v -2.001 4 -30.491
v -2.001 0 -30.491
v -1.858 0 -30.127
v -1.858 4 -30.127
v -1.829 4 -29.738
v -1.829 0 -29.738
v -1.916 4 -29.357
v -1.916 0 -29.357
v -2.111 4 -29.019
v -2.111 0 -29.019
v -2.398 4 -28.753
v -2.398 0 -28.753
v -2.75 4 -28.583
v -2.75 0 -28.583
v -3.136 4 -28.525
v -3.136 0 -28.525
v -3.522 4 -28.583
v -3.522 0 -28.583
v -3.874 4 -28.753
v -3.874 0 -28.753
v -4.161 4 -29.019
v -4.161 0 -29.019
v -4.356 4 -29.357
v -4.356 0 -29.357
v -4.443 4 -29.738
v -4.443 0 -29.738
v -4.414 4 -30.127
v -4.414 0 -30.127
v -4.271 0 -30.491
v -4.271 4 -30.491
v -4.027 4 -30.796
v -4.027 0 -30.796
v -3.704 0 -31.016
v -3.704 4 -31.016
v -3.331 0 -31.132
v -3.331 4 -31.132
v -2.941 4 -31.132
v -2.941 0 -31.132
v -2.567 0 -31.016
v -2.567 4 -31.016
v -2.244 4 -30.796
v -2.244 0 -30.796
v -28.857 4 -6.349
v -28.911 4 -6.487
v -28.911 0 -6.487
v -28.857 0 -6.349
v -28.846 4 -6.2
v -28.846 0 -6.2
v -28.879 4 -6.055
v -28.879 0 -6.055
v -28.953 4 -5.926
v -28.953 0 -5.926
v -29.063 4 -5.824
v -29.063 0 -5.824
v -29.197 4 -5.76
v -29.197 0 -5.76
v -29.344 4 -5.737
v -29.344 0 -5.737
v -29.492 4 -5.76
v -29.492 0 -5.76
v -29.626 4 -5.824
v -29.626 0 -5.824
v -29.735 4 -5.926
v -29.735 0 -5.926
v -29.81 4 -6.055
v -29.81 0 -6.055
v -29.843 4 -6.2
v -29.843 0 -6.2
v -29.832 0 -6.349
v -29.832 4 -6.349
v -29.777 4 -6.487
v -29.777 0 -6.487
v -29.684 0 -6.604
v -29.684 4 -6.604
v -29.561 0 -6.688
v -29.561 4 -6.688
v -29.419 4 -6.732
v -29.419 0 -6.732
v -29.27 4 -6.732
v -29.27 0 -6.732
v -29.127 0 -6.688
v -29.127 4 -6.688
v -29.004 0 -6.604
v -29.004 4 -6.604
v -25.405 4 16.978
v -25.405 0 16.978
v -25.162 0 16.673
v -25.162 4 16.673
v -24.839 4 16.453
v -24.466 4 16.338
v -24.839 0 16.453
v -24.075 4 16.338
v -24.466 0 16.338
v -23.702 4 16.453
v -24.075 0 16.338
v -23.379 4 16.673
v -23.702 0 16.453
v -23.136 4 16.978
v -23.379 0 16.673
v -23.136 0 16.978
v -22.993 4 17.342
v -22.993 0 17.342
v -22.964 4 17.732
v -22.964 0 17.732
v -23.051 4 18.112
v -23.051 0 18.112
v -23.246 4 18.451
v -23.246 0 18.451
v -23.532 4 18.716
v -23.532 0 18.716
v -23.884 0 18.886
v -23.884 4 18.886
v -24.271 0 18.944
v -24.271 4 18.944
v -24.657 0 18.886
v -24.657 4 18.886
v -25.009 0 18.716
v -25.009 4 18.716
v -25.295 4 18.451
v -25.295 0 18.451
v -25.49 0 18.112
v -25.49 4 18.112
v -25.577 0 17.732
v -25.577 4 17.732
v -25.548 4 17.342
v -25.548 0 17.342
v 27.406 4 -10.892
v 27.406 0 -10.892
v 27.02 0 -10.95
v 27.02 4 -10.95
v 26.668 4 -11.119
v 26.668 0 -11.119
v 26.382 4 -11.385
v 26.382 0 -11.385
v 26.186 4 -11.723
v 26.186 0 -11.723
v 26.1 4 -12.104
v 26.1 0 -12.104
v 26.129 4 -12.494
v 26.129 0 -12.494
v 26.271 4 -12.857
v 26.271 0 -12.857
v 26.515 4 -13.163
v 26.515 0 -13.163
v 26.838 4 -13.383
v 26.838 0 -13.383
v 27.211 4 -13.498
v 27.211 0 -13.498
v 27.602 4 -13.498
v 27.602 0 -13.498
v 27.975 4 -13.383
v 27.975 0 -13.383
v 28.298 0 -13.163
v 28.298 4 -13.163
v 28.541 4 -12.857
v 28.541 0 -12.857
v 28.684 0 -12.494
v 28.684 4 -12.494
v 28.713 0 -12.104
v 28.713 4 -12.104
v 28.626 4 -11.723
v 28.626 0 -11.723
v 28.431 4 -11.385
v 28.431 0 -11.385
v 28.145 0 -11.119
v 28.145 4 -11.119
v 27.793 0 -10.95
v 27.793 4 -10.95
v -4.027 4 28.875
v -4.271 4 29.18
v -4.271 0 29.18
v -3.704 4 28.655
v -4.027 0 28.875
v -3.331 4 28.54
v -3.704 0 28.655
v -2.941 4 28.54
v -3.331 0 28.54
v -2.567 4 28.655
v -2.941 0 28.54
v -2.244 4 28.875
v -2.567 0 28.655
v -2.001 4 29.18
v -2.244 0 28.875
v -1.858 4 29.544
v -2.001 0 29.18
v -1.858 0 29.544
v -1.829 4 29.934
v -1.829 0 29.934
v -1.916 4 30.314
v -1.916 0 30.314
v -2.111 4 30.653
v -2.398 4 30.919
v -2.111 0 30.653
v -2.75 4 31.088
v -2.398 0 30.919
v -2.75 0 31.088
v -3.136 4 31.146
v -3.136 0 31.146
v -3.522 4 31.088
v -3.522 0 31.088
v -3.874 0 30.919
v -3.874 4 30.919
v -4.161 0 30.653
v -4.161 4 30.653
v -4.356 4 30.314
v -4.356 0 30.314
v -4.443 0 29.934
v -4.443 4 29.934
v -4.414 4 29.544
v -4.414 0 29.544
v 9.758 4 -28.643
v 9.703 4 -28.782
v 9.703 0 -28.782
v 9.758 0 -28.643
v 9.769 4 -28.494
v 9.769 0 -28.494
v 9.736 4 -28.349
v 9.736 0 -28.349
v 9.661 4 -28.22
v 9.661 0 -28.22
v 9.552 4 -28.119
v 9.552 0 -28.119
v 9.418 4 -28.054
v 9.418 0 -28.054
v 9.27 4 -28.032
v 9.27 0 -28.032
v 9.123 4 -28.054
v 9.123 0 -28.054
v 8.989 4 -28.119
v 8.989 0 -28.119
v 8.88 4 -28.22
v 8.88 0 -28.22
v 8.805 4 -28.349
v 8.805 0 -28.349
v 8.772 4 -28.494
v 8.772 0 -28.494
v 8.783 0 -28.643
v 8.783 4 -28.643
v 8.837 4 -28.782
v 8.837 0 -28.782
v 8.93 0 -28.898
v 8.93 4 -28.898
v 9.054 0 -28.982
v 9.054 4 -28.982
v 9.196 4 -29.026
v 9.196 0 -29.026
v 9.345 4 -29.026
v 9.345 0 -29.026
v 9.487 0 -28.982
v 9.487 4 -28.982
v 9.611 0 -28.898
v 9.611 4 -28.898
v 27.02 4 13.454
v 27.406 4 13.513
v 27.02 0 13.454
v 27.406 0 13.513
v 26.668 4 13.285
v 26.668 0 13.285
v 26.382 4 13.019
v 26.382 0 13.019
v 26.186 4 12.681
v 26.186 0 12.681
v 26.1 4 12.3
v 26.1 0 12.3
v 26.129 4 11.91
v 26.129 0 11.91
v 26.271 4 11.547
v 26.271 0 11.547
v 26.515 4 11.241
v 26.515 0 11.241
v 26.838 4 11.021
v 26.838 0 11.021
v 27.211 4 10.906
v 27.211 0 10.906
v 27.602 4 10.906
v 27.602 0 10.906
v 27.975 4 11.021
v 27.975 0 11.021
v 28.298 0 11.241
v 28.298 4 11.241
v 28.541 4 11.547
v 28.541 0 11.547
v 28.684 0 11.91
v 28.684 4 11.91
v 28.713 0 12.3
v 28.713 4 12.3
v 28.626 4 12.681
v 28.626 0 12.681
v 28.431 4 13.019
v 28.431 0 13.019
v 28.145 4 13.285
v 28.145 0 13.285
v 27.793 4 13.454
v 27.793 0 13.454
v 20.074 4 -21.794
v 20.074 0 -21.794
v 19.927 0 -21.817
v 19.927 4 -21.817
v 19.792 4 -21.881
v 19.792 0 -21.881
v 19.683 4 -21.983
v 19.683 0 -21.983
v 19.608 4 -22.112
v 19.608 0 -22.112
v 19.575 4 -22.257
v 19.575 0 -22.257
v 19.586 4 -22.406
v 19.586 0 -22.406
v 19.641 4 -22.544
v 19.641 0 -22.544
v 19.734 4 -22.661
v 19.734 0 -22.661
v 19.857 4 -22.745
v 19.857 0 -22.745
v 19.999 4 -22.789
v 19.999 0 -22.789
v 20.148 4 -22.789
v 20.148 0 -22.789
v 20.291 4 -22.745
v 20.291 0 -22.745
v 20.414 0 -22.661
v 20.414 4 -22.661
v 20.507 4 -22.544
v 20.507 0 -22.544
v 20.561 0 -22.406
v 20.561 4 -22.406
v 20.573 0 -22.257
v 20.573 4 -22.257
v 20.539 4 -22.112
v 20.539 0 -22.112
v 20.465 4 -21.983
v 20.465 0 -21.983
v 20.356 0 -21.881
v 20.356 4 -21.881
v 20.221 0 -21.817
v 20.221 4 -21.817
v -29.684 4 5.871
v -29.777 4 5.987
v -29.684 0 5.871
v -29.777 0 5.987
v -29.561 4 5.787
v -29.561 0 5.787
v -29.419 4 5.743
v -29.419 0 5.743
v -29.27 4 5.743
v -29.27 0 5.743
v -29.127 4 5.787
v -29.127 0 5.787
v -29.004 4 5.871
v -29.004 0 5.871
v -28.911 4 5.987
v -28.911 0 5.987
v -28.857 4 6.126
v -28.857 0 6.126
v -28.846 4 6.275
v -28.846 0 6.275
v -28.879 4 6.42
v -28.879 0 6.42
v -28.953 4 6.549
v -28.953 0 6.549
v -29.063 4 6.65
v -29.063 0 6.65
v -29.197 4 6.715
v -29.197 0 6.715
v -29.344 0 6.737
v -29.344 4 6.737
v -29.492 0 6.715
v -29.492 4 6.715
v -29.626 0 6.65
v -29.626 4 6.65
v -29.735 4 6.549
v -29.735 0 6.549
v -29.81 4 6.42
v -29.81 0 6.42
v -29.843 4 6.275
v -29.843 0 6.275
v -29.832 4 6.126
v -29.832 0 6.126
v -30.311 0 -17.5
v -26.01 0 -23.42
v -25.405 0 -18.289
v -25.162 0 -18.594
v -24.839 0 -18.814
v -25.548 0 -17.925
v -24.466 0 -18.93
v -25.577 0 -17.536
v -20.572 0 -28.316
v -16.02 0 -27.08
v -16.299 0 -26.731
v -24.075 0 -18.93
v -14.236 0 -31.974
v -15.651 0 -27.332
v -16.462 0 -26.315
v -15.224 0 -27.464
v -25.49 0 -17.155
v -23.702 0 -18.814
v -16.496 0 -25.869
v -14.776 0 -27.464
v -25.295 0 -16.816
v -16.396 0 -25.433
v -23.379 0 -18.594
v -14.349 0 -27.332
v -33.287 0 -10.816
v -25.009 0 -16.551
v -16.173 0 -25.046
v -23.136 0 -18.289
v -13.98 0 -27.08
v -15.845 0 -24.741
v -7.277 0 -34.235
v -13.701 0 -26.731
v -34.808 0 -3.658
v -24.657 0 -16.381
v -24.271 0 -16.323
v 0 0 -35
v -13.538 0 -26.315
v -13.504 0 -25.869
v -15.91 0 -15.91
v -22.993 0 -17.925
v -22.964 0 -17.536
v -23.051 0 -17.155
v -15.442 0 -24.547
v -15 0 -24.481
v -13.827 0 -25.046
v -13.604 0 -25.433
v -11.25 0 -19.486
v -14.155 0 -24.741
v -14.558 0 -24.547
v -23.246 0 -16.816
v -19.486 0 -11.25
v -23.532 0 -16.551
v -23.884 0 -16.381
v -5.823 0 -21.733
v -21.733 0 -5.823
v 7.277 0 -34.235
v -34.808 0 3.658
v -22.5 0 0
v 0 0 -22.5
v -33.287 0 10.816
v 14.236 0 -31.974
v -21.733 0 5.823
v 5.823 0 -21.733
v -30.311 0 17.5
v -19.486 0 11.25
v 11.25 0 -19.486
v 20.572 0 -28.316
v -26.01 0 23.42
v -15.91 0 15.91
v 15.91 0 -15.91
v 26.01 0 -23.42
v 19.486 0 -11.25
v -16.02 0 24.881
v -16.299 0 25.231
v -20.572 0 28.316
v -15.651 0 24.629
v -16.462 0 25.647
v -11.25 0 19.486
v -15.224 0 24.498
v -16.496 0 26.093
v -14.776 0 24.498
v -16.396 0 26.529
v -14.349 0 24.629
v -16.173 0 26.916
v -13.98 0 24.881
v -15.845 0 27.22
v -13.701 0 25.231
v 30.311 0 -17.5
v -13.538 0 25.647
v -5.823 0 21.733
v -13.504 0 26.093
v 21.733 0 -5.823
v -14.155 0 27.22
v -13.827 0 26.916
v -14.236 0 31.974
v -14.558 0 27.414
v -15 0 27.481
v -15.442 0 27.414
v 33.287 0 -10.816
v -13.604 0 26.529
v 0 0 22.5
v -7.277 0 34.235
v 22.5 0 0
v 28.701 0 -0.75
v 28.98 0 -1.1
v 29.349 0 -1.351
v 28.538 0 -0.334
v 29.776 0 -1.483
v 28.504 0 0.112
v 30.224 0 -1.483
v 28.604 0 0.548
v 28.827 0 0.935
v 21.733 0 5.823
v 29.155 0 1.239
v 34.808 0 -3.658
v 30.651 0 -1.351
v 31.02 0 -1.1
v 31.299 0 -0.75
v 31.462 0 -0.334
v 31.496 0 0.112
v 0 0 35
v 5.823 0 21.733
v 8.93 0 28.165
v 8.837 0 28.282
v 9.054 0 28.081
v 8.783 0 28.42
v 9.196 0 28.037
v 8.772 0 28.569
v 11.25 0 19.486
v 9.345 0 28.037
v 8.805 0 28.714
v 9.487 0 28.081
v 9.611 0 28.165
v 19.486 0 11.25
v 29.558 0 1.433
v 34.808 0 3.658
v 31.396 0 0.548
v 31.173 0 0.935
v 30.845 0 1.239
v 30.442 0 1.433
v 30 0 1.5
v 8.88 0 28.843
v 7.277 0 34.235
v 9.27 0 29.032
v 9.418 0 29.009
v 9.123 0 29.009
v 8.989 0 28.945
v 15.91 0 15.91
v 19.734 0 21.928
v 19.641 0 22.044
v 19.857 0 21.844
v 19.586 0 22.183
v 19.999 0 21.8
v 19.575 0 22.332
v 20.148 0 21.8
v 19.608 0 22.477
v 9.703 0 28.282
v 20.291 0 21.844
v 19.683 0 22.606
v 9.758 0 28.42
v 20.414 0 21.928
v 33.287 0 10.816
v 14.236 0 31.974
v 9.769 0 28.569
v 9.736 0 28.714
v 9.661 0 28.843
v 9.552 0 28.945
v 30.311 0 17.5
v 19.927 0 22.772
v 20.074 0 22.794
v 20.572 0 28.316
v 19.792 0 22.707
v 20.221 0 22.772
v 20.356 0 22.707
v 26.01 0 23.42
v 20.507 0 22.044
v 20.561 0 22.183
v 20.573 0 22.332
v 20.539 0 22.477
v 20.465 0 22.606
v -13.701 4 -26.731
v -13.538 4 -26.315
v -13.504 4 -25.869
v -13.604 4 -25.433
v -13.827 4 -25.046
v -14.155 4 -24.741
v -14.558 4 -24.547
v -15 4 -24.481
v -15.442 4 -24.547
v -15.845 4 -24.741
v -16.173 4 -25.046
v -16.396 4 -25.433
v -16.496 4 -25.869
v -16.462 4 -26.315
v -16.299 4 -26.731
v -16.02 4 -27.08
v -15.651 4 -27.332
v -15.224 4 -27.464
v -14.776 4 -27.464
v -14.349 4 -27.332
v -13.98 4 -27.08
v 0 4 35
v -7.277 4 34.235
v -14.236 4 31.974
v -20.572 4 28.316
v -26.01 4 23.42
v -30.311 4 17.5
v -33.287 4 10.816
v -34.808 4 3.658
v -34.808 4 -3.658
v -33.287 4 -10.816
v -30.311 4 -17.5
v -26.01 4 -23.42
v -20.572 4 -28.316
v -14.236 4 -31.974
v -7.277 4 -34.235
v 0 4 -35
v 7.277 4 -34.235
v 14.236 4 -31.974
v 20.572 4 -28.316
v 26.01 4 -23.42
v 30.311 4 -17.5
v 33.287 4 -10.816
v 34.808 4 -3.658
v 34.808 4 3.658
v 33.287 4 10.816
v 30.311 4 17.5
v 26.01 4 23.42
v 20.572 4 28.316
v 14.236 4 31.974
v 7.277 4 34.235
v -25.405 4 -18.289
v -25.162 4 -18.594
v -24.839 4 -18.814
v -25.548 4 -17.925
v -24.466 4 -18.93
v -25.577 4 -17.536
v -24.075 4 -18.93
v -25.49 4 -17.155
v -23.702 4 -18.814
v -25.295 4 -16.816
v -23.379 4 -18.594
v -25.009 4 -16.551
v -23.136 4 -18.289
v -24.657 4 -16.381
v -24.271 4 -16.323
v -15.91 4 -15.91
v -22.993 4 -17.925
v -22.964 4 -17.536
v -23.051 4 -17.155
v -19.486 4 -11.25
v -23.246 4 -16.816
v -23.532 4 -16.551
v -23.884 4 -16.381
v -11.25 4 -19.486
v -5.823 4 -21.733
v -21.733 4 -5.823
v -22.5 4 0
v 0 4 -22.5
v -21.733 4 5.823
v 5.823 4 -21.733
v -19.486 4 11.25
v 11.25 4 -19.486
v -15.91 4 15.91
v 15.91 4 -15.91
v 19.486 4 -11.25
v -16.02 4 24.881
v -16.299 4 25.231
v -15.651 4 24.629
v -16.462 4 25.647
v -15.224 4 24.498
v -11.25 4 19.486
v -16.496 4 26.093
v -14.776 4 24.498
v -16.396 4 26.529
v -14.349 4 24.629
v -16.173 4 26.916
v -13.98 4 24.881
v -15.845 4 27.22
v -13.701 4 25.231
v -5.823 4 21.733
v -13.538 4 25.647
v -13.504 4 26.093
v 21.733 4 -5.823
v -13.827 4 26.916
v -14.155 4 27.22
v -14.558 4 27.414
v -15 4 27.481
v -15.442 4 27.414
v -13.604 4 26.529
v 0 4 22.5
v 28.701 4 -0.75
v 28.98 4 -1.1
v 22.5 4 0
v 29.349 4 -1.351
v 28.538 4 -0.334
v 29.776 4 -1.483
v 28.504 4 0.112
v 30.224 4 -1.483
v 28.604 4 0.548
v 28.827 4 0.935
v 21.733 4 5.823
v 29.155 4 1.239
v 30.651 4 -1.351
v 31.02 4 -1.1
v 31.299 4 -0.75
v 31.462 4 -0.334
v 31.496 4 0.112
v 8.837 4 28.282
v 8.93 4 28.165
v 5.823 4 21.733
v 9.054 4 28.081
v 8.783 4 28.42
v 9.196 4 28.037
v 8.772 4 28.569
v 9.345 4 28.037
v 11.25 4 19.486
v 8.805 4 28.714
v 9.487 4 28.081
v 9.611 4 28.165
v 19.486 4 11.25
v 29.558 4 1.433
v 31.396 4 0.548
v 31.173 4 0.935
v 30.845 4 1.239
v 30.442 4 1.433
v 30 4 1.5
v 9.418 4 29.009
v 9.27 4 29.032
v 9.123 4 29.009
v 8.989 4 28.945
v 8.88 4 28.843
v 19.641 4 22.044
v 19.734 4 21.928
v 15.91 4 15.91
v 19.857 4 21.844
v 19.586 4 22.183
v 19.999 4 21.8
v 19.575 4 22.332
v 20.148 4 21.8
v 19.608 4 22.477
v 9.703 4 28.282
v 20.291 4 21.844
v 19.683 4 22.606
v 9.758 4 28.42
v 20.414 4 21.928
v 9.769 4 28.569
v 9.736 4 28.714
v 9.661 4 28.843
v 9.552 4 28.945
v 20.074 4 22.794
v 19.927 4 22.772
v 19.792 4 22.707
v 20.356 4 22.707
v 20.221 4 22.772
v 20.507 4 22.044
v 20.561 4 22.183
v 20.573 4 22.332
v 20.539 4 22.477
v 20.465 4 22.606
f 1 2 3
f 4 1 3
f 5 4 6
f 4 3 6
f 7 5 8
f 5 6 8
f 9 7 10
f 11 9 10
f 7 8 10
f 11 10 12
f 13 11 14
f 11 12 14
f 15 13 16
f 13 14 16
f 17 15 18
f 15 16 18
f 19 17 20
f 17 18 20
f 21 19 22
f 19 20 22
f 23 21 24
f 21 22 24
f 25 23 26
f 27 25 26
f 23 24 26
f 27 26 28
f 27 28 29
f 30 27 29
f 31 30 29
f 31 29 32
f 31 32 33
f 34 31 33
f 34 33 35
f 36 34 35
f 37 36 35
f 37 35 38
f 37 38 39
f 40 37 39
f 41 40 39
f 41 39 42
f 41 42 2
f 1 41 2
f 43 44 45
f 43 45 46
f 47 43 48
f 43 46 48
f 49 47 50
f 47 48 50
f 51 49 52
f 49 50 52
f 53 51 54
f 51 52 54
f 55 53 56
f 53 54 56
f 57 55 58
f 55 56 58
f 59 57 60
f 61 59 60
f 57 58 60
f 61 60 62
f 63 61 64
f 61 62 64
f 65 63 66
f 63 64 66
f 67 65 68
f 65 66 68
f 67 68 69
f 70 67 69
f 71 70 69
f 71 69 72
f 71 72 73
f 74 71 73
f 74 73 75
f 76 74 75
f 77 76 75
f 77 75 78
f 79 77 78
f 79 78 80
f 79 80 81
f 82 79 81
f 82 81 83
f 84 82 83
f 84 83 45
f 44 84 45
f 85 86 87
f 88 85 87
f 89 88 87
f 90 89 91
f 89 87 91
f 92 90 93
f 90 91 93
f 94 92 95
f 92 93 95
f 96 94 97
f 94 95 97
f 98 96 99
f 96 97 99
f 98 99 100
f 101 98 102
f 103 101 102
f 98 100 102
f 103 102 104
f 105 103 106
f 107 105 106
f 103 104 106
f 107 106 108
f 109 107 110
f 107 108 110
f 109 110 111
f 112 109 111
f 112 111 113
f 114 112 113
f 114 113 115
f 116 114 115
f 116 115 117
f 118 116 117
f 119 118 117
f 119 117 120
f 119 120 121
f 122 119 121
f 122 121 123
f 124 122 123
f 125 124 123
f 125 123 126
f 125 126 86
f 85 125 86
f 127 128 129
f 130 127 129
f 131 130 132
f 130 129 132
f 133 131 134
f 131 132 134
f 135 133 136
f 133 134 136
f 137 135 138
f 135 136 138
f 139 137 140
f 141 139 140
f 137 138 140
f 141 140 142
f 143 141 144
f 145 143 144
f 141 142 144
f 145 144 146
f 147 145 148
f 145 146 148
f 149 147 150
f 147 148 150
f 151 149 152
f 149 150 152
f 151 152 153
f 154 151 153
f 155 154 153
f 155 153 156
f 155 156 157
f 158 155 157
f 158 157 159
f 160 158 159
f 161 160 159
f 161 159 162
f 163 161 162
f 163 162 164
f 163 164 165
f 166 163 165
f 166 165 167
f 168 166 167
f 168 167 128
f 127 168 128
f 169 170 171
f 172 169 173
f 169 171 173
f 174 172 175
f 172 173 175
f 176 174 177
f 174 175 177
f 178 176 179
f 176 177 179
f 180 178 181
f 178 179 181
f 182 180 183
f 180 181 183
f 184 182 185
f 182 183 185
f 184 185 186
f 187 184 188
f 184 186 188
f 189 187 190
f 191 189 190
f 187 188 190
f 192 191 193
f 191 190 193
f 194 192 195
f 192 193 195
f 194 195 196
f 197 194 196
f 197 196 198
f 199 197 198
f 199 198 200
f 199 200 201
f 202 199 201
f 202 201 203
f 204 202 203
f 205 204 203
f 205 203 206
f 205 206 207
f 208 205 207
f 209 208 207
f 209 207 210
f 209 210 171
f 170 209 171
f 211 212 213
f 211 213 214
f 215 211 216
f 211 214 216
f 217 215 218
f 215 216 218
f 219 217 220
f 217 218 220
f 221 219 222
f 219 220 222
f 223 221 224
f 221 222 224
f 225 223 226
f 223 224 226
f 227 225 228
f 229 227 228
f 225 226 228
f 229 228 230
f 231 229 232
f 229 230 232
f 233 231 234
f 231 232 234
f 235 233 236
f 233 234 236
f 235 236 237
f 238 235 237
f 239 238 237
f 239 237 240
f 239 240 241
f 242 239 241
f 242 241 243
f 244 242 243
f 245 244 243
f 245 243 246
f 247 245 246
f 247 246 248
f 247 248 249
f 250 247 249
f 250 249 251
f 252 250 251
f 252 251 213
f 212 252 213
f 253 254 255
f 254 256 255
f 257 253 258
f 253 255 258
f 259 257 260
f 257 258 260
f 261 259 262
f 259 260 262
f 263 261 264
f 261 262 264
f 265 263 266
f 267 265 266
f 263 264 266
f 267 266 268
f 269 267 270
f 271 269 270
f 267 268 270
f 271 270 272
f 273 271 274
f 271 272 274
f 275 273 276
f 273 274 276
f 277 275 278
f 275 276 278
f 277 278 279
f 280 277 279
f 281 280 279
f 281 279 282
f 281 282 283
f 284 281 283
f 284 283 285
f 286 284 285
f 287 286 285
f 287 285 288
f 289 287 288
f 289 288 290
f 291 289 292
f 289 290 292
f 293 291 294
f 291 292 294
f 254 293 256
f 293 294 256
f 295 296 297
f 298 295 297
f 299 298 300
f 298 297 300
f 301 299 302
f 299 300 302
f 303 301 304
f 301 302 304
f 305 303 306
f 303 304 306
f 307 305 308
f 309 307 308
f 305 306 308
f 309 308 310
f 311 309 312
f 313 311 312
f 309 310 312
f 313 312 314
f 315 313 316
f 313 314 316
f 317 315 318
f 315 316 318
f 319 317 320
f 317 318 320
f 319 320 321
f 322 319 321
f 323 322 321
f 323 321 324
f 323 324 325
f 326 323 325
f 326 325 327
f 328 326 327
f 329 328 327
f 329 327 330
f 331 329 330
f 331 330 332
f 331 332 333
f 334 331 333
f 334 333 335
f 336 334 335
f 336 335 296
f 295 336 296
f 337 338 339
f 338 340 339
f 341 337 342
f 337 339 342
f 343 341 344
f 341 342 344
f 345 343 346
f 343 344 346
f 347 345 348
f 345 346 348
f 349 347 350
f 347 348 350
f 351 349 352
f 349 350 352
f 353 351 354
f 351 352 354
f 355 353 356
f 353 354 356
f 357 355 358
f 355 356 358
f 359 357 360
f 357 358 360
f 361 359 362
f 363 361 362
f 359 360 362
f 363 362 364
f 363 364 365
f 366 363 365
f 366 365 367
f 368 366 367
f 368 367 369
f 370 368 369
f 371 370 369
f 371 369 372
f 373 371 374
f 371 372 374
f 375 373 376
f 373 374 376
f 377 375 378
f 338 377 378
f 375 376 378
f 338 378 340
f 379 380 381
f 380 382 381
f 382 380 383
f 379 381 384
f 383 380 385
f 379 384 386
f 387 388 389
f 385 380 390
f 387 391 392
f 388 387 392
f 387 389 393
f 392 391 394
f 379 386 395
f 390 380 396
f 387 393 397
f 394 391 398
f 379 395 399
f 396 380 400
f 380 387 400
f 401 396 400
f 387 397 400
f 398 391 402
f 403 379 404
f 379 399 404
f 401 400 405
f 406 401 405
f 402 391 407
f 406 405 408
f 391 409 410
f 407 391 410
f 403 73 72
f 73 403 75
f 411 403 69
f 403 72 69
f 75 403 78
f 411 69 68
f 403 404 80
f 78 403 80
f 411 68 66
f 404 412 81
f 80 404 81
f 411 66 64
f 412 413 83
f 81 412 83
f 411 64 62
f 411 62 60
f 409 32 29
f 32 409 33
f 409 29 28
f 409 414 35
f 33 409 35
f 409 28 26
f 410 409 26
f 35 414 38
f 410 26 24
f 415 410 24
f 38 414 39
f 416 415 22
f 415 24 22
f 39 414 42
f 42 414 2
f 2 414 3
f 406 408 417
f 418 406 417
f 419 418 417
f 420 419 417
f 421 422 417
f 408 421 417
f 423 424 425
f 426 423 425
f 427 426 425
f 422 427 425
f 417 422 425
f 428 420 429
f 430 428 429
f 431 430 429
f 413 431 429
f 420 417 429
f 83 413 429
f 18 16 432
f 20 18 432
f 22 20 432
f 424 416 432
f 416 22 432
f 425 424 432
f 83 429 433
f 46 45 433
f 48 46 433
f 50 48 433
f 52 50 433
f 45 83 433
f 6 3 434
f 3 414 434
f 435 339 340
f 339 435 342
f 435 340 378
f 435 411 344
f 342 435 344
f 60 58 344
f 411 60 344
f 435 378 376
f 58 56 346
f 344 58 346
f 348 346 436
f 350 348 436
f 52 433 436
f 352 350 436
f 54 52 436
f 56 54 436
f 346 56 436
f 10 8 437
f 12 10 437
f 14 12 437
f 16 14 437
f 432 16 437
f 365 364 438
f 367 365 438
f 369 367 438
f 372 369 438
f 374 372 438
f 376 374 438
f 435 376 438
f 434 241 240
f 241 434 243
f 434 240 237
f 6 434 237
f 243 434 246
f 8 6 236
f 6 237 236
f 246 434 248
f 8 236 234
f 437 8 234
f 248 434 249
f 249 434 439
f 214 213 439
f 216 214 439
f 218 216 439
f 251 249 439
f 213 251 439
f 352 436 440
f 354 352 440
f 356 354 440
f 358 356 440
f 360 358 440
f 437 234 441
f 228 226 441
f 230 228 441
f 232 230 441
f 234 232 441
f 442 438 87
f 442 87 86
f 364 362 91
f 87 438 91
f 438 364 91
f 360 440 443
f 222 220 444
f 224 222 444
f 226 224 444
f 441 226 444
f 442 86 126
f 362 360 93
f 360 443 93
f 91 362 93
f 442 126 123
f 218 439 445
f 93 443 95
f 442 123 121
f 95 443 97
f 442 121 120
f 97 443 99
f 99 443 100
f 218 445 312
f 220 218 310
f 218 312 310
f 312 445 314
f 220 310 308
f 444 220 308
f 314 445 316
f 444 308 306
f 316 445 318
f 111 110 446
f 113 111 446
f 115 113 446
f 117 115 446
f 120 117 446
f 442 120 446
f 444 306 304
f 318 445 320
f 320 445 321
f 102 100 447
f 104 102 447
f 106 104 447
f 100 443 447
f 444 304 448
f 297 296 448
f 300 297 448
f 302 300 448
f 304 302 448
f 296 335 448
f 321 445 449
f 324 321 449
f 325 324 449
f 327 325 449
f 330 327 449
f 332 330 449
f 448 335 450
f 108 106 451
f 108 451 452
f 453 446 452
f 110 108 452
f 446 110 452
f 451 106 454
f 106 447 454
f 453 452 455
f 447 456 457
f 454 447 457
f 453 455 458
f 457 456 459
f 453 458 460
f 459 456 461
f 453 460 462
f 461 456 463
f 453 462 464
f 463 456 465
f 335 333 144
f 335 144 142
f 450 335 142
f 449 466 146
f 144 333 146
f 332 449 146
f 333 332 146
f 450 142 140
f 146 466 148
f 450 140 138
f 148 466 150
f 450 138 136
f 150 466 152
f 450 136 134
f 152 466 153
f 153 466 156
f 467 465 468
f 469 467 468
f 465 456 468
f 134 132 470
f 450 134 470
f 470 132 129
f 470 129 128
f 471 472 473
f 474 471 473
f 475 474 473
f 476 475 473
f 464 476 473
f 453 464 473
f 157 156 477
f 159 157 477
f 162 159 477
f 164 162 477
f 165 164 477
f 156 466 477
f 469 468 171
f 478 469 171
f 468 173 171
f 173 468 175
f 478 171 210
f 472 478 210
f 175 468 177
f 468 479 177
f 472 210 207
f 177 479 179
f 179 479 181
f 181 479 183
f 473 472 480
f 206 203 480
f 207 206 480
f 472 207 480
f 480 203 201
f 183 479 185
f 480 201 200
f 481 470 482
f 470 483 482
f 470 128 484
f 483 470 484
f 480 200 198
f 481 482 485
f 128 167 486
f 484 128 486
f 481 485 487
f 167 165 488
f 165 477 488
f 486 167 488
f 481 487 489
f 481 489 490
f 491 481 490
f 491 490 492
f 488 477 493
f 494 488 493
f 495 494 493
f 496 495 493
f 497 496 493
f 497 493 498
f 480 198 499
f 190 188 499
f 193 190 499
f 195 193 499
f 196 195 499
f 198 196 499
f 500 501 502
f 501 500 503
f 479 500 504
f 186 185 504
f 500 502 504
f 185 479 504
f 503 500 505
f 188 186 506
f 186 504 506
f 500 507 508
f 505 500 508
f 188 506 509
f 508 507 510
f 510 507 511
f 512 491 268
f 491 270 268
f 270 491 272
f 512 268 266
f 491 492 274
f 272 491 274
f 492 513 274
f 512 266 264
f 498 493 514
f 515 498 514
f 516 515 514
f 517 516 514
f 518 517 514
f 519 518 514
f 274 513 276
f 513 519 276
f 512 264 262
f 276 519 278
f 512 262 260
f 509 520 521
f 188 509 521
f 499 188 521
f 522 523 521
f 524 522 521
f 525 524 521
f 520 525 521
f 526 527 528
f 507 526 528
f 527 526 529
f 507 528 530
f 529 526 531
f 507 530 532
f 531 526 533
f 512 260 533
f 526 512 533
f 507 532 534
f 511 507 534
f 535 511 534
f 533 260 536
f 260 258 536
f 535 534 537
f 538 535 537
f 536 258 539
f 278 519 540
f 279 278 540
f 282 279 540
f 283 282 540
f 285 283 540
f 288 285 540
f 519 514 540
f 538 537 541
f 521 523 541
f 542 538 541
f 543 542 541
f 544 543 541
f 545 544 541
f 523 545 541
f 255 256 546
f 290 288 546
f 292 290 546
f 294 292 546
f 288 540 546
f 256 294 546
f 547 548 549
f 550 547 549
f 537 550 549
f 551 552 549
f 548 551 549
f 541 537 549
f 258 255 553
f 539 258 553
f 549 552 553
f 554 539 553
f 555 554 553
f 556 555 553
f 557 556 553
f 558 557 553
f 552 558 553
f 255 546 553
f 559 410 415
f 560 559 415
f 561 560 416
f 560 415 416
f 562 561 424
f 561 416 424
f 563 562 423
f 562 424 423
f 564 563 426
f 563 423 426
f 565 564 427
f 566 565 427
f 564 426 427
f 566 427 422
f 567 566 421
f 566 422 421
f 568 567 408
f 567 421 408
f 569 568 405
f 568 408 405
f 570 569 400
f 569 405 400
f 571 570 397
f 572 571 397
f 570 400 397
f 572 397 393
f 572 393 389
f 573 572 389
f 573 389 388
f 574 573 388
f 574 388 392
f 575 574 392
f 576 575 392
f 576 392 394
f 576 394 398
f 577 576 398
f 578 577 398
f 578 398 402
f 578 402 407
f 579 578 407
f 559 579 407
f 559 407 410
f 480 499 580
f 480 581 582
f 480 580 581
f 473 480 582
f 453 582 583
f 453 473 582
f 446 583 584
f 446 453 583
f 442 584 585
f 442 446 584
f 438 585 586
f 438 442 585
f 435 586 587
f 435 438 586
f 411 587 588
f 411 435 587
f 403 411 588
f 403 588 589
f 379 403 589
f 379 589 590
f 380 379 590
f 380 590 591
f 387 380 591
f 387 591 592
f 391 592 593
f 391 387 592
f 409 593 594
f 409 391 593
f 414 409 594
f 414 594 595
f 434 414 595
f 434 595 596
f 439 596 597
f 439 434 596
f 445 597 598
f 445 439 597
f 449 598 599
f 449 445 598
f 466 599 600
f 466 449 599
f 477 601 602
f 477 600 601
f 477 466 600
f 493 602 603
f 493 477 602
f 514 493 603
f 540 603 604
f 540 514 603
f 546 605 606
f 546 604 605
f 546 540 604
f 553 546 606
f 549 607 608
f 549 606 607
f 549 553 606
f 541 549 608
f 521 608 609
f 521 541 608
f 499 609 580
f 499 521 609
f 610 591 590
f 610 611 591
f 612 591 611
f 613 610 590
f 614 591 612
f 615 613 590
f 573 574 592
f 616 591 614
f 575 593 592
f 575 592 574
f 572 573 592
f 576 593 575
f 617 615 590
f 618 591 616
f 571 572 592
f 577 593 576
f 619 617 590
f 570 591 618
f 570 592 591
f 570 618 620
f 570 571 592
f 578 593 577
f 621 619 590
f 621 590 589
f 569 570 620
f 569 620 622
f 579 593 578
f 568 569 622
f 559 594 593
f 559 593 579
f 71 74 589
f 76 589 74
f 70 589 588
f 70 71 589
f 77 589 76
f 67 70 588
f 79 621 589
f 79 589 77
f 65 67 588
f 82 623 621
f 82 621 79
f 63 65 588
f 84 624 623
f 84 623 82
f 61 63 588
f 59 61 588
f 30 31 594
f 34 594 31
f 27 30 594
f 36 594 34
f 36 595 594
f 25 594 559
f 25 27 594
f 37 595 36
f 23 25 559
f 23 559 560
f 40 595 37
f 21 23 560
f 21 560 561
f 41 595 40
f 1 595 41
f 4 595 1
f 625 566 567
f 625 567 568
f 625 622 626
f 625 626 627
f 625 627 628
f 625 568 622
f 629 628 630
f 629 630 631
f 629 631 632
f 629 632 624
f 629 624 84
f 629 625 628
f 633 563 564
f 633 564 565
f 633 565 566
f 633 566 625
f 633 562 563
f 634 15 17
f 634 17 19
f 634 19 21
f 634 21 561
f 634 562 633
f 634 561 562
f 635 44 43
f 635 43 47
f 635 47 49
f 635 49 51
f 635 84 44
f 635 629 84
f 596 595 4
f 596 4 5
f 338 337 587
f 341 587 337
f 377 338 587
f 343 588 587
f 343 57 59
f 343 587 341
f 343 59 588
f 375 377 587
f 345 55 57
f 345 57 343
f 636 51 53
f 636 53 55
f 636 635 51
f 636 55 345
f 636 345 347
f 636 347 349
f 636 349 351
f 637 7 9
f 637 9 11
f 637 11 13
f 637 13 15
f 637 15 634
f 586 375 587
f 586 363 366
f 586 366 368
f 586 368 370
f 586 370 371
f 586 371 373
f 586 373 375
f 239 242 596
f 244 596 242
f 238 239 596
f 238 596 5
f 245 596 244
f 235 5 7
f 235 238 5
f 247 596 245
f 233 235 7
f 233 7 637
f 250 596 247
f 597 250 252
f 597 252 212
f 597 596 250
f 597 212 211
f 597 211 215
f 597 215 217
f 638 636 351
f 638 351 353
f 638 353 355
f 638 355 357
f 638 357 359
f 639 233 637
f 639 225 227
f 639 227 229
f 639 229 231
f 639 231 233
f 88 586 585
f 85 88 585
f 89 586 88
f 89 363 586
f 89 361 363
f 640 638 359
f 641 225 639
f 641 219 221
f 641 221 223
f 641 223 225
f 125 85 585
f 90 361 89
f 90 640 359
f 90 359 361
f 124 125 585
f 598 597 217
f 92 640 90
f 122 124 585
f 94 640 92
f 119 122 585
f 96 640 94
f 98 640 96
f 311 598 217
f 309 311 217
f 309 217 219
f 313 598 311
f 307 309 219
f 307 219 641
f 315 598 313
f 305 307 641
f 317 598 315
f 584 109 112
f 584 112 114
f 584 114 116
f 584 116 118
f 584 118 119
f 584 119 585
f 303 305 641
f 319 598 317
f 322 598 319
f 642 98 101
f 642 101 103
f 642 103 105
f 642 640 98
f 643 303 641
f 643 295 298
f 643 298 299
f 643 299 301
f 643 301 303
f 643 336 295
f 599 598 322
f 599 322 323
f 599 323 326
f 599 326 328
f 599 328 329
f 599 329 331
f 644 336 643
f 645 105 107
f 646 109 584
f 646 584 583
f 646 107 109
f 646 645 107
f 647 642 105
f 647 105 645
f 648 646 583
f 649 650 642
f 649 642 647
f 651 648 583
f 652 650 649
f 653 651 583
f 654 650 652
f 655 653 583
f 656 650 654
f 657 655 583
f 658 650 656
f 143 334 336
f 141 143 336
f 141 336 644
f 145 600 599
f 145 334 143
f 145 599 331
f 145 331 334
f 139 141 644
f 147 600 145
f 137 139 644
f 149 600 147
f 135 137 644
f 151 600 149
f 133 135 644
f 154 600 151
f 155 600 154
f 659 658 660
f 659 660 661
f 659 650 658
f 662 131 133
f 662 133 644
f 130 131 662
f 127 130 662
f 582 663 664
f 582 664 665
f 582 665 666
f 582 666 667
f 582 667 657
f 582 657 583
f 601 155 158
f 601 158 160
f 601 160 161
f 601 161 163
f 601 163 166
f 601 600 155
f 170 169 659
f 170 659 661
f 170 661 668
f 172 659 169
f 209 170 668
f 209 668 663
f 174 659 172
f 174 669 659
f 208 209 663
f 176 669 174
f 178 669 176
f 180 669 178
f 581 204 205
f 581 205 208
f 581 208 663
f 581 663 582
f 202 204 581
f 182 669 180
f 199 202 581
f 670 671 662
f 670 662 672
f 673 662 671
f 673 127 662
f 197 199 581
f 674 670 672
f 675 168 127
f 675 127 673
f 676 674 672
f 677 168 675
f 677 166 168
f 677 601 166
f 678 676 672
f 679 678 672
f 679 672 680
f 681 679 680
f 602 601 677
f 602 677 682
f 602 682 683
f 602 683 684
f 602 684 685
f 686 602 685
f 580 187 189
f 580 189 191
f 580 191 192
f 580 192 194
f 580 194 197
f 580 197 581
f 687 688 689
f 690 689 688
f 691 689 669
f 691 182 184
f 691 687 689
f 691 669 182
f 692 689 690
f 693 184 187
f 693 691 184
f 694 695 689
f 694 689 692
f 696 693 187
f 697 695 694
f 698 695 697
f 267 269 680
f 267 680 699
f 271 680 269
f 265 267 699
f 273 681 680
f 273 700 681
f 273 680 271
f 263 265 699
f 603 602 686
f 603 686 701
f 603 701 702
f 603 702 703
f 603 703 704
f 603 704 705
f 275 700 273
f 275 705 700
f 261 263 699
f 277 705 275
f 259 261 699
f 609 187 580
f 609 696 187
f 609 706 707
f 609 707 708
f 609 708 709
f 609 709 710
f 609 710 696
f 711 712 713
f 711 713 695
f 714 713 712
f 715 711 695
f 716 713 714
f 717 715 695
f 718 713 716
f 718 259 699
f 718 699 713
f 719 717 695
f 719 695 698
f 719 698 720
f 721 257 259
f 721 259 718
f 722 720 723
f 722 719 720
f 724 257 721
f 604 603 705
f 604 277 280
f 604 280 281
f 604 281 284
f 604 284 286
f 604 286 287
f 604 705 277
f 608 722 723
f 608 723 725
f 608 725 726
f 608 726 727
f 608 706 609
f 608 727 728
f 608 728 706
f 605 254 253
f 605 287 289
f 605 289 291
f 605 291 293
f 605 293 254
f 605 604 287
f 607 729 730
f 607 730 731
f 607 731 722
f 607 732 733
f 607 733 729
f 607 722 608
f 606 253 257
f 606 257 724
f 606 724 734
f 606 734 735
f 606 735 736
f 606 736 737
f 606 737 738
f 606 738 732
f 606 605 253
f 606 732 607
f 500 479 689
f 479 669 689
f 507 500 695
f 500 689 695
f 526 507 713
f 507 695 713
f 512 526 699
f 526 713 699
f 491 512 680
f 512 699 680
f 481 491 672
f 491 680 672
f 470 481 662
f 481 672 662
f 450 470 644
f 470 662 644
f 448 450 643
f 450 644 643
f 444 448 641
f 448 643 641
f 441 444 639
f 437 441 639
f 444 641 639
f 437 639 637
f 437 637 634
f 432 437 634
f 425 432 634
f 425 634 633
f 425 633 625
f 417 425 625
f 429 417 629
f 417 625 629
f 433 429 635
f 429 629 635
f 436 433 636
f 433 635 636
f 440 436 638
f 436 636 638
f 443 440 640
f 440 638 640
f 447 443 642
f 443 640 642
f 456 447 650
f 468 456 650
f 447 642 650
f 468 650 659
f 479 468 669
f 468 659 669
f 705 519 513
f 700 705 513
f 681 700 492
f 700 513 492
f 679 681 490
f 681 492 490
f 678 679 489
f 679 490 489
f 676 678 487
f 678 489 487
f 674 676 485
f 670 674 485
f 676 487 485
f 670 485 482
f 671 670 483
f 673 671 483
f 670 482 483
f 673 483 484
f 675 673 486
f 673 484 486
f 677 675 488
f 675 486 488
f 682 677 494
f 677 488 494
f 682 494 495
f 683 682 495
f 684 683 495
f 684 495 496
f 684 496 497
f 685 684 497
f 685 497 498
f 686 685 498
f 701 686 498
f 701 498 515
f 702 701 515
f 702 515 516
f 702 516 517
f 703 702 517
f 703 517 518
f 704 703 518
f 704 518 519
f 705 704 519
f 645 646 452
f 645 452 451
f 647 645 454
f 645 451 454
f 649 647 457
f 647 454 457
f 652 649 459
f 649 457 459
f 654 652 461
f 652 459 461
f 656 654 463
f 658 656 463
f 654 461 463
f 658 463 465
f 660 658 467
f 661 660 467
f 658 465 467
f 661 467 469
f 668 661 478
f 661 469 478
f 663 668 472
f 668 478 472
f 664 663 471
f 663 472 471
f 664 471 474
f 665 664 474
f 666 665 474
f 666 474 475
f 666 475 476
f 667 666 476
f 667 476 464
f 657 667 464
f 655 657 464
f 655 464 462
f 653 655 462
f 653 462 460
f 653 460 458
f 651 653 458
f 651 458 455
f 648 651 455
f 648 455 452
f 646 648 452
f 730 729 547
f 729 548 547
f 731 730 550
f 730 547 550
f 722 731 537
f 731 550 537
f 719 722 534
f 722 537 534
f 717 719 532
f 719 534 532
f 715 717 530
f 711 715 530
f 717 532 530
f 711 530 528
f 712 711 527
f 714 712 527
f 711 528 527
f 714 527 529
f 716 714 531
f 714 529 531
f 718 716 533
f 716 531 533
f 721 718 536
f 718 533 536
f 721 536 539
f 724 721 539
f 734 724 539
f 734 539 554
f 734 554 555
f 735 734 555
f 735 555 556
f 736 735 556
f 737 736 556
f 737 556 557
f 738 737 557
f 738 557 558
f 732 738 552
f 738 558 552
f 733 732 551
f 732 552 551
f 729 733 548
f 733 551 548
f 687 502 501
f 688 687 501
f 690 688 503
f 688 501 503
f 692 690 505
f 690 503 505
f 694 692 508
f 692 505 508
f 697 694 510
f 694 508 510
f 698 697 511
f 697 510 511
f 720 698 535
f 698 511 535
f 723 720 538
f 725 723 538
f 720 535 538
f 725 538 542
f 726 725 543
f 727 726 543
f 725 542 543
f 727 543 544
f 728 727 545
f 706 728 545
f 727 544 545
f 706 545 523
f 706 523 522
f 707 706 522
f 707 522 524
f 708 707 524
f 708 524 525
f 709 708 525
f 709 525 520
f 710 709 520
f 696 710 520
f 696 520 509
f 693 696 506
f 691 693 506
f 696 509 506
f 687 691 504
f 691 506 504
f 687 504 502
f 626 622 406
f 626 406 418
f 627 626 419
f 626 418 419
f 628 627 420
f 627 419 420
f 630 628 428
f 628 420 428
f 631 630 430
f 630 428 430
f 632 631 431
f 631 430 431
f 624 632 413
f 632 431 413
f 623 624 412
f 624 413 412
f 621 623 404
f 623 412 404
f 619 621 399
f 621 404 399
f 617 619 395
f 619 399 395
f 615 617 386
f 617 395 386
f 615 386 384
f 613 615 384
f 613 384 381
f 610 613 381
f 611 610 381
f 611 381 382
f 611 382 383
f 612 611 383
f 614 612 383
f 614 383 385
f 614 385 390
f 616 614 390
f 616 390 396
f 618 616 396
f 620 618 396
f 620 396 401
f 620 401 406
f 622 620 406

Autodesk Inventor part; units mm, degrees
ref_plane "YZ Plane" through (0, 0, 0) normal (1, 0, 0) x (0, 1, 0)
ref_plane "XZ Plane" through (0, 0, 0) normal (0, 1, 0) x (-1, 0, 0)
ref_plane "XY Plane" through (0, 0, 0) normal (0, 0, 1) x (1, 0, 0)
sketch "Sketch1" plane through (0, 0, 0) normal (1, 0, 0) x (0, 1, 0)
  line L0 (0, 22.5) -> (4, 22.5)
  line L1 (4, 22.5) -> (4, 35)
  line L2 (4, 35) -> (0, 35)
  line L3 (0, 35) -> (0, 22.5)
  line L4 (-0.8, 0) -> (4.8, 0) projected
  point P0 (0, 0)
  dimension "d0" = 22.5
  dimension "d1" = 35
  dimension "d2" = 4
revolve "Revolution1" add sketch "Sketch1" angle 360 about axis through (0, -10, 0) along (0, 1, 0)
sketch "Sketch2" plane through (0, 4, 0) normal (0, 1, 0) x (1, 0, 0)
  point P0 (0, 0)
  point P1 (30, 0)
  dimension "d5" = 30
hole "Hole1" at (30, 4, 0) direction (0, -1, 0) diameter 3 end through all
pattern_circular "Circular Pattern1" count 3 over 360 about axis through (0, 2, 0) along (0, 1, 0) of "Hole1"
sketch "Sketch3" plane through (0, 4, 0) normal (0, 1, 0) x (1, 0, 0)
  circle A0 centre (0, 0) radius 30 construction
  circle A1 centre (30, 0) radius 1.5 projected
  point P0 (27.4064, 12.2021)
  point P1 (27.4064, -12.2021)
  dimension "d16" = 60
  dimension "d18" = 24
  dimension "d20" = 24
hole "Hole2" at (27.4064, 4, -12.2021) at (27.4064, 4, 12.2021) direction (0, -1, 0) diameter 2.6211 end through all thread size "M3x0.35" class "6H" standard "ANSI Metric M Profile"
pattern_circular "Circular Pattern2" count 3 over 360 about axis through (0, 2, 0) along (0, 1, 0) of "Hole2"
sketch "Sketch4" plane through (0, 4, 0) normal (0, 1, 0) x (1, 0, 0)
  circle A0 centre (0, 0) radius 30 construction
  circle A1 centre (27.4064, -12.2021) radius 1.3106 projected
  circle A2 centre (27.4064, 12.2021) radius 1.3106 projected
  point P0 (20.0739, -22.2943)
  point P1 (20.0739, 22.2943)
  dimension "d31" = 60
  dimension "d34" = 24
  dimension "d35" = 24
hole "Hole3" at (20.0739, 4, -22.2943) at (20.0739, 4, 22.2943) direction (0, -1, 0) diameter 1 end through all
pattern_circular "Circular Pattern3" count 3 over 360 about axis through (0, 2, 0) along (0, 1, 0) of "Hole3"
properties part number "CentralRing-2023-1" material "Copper"
